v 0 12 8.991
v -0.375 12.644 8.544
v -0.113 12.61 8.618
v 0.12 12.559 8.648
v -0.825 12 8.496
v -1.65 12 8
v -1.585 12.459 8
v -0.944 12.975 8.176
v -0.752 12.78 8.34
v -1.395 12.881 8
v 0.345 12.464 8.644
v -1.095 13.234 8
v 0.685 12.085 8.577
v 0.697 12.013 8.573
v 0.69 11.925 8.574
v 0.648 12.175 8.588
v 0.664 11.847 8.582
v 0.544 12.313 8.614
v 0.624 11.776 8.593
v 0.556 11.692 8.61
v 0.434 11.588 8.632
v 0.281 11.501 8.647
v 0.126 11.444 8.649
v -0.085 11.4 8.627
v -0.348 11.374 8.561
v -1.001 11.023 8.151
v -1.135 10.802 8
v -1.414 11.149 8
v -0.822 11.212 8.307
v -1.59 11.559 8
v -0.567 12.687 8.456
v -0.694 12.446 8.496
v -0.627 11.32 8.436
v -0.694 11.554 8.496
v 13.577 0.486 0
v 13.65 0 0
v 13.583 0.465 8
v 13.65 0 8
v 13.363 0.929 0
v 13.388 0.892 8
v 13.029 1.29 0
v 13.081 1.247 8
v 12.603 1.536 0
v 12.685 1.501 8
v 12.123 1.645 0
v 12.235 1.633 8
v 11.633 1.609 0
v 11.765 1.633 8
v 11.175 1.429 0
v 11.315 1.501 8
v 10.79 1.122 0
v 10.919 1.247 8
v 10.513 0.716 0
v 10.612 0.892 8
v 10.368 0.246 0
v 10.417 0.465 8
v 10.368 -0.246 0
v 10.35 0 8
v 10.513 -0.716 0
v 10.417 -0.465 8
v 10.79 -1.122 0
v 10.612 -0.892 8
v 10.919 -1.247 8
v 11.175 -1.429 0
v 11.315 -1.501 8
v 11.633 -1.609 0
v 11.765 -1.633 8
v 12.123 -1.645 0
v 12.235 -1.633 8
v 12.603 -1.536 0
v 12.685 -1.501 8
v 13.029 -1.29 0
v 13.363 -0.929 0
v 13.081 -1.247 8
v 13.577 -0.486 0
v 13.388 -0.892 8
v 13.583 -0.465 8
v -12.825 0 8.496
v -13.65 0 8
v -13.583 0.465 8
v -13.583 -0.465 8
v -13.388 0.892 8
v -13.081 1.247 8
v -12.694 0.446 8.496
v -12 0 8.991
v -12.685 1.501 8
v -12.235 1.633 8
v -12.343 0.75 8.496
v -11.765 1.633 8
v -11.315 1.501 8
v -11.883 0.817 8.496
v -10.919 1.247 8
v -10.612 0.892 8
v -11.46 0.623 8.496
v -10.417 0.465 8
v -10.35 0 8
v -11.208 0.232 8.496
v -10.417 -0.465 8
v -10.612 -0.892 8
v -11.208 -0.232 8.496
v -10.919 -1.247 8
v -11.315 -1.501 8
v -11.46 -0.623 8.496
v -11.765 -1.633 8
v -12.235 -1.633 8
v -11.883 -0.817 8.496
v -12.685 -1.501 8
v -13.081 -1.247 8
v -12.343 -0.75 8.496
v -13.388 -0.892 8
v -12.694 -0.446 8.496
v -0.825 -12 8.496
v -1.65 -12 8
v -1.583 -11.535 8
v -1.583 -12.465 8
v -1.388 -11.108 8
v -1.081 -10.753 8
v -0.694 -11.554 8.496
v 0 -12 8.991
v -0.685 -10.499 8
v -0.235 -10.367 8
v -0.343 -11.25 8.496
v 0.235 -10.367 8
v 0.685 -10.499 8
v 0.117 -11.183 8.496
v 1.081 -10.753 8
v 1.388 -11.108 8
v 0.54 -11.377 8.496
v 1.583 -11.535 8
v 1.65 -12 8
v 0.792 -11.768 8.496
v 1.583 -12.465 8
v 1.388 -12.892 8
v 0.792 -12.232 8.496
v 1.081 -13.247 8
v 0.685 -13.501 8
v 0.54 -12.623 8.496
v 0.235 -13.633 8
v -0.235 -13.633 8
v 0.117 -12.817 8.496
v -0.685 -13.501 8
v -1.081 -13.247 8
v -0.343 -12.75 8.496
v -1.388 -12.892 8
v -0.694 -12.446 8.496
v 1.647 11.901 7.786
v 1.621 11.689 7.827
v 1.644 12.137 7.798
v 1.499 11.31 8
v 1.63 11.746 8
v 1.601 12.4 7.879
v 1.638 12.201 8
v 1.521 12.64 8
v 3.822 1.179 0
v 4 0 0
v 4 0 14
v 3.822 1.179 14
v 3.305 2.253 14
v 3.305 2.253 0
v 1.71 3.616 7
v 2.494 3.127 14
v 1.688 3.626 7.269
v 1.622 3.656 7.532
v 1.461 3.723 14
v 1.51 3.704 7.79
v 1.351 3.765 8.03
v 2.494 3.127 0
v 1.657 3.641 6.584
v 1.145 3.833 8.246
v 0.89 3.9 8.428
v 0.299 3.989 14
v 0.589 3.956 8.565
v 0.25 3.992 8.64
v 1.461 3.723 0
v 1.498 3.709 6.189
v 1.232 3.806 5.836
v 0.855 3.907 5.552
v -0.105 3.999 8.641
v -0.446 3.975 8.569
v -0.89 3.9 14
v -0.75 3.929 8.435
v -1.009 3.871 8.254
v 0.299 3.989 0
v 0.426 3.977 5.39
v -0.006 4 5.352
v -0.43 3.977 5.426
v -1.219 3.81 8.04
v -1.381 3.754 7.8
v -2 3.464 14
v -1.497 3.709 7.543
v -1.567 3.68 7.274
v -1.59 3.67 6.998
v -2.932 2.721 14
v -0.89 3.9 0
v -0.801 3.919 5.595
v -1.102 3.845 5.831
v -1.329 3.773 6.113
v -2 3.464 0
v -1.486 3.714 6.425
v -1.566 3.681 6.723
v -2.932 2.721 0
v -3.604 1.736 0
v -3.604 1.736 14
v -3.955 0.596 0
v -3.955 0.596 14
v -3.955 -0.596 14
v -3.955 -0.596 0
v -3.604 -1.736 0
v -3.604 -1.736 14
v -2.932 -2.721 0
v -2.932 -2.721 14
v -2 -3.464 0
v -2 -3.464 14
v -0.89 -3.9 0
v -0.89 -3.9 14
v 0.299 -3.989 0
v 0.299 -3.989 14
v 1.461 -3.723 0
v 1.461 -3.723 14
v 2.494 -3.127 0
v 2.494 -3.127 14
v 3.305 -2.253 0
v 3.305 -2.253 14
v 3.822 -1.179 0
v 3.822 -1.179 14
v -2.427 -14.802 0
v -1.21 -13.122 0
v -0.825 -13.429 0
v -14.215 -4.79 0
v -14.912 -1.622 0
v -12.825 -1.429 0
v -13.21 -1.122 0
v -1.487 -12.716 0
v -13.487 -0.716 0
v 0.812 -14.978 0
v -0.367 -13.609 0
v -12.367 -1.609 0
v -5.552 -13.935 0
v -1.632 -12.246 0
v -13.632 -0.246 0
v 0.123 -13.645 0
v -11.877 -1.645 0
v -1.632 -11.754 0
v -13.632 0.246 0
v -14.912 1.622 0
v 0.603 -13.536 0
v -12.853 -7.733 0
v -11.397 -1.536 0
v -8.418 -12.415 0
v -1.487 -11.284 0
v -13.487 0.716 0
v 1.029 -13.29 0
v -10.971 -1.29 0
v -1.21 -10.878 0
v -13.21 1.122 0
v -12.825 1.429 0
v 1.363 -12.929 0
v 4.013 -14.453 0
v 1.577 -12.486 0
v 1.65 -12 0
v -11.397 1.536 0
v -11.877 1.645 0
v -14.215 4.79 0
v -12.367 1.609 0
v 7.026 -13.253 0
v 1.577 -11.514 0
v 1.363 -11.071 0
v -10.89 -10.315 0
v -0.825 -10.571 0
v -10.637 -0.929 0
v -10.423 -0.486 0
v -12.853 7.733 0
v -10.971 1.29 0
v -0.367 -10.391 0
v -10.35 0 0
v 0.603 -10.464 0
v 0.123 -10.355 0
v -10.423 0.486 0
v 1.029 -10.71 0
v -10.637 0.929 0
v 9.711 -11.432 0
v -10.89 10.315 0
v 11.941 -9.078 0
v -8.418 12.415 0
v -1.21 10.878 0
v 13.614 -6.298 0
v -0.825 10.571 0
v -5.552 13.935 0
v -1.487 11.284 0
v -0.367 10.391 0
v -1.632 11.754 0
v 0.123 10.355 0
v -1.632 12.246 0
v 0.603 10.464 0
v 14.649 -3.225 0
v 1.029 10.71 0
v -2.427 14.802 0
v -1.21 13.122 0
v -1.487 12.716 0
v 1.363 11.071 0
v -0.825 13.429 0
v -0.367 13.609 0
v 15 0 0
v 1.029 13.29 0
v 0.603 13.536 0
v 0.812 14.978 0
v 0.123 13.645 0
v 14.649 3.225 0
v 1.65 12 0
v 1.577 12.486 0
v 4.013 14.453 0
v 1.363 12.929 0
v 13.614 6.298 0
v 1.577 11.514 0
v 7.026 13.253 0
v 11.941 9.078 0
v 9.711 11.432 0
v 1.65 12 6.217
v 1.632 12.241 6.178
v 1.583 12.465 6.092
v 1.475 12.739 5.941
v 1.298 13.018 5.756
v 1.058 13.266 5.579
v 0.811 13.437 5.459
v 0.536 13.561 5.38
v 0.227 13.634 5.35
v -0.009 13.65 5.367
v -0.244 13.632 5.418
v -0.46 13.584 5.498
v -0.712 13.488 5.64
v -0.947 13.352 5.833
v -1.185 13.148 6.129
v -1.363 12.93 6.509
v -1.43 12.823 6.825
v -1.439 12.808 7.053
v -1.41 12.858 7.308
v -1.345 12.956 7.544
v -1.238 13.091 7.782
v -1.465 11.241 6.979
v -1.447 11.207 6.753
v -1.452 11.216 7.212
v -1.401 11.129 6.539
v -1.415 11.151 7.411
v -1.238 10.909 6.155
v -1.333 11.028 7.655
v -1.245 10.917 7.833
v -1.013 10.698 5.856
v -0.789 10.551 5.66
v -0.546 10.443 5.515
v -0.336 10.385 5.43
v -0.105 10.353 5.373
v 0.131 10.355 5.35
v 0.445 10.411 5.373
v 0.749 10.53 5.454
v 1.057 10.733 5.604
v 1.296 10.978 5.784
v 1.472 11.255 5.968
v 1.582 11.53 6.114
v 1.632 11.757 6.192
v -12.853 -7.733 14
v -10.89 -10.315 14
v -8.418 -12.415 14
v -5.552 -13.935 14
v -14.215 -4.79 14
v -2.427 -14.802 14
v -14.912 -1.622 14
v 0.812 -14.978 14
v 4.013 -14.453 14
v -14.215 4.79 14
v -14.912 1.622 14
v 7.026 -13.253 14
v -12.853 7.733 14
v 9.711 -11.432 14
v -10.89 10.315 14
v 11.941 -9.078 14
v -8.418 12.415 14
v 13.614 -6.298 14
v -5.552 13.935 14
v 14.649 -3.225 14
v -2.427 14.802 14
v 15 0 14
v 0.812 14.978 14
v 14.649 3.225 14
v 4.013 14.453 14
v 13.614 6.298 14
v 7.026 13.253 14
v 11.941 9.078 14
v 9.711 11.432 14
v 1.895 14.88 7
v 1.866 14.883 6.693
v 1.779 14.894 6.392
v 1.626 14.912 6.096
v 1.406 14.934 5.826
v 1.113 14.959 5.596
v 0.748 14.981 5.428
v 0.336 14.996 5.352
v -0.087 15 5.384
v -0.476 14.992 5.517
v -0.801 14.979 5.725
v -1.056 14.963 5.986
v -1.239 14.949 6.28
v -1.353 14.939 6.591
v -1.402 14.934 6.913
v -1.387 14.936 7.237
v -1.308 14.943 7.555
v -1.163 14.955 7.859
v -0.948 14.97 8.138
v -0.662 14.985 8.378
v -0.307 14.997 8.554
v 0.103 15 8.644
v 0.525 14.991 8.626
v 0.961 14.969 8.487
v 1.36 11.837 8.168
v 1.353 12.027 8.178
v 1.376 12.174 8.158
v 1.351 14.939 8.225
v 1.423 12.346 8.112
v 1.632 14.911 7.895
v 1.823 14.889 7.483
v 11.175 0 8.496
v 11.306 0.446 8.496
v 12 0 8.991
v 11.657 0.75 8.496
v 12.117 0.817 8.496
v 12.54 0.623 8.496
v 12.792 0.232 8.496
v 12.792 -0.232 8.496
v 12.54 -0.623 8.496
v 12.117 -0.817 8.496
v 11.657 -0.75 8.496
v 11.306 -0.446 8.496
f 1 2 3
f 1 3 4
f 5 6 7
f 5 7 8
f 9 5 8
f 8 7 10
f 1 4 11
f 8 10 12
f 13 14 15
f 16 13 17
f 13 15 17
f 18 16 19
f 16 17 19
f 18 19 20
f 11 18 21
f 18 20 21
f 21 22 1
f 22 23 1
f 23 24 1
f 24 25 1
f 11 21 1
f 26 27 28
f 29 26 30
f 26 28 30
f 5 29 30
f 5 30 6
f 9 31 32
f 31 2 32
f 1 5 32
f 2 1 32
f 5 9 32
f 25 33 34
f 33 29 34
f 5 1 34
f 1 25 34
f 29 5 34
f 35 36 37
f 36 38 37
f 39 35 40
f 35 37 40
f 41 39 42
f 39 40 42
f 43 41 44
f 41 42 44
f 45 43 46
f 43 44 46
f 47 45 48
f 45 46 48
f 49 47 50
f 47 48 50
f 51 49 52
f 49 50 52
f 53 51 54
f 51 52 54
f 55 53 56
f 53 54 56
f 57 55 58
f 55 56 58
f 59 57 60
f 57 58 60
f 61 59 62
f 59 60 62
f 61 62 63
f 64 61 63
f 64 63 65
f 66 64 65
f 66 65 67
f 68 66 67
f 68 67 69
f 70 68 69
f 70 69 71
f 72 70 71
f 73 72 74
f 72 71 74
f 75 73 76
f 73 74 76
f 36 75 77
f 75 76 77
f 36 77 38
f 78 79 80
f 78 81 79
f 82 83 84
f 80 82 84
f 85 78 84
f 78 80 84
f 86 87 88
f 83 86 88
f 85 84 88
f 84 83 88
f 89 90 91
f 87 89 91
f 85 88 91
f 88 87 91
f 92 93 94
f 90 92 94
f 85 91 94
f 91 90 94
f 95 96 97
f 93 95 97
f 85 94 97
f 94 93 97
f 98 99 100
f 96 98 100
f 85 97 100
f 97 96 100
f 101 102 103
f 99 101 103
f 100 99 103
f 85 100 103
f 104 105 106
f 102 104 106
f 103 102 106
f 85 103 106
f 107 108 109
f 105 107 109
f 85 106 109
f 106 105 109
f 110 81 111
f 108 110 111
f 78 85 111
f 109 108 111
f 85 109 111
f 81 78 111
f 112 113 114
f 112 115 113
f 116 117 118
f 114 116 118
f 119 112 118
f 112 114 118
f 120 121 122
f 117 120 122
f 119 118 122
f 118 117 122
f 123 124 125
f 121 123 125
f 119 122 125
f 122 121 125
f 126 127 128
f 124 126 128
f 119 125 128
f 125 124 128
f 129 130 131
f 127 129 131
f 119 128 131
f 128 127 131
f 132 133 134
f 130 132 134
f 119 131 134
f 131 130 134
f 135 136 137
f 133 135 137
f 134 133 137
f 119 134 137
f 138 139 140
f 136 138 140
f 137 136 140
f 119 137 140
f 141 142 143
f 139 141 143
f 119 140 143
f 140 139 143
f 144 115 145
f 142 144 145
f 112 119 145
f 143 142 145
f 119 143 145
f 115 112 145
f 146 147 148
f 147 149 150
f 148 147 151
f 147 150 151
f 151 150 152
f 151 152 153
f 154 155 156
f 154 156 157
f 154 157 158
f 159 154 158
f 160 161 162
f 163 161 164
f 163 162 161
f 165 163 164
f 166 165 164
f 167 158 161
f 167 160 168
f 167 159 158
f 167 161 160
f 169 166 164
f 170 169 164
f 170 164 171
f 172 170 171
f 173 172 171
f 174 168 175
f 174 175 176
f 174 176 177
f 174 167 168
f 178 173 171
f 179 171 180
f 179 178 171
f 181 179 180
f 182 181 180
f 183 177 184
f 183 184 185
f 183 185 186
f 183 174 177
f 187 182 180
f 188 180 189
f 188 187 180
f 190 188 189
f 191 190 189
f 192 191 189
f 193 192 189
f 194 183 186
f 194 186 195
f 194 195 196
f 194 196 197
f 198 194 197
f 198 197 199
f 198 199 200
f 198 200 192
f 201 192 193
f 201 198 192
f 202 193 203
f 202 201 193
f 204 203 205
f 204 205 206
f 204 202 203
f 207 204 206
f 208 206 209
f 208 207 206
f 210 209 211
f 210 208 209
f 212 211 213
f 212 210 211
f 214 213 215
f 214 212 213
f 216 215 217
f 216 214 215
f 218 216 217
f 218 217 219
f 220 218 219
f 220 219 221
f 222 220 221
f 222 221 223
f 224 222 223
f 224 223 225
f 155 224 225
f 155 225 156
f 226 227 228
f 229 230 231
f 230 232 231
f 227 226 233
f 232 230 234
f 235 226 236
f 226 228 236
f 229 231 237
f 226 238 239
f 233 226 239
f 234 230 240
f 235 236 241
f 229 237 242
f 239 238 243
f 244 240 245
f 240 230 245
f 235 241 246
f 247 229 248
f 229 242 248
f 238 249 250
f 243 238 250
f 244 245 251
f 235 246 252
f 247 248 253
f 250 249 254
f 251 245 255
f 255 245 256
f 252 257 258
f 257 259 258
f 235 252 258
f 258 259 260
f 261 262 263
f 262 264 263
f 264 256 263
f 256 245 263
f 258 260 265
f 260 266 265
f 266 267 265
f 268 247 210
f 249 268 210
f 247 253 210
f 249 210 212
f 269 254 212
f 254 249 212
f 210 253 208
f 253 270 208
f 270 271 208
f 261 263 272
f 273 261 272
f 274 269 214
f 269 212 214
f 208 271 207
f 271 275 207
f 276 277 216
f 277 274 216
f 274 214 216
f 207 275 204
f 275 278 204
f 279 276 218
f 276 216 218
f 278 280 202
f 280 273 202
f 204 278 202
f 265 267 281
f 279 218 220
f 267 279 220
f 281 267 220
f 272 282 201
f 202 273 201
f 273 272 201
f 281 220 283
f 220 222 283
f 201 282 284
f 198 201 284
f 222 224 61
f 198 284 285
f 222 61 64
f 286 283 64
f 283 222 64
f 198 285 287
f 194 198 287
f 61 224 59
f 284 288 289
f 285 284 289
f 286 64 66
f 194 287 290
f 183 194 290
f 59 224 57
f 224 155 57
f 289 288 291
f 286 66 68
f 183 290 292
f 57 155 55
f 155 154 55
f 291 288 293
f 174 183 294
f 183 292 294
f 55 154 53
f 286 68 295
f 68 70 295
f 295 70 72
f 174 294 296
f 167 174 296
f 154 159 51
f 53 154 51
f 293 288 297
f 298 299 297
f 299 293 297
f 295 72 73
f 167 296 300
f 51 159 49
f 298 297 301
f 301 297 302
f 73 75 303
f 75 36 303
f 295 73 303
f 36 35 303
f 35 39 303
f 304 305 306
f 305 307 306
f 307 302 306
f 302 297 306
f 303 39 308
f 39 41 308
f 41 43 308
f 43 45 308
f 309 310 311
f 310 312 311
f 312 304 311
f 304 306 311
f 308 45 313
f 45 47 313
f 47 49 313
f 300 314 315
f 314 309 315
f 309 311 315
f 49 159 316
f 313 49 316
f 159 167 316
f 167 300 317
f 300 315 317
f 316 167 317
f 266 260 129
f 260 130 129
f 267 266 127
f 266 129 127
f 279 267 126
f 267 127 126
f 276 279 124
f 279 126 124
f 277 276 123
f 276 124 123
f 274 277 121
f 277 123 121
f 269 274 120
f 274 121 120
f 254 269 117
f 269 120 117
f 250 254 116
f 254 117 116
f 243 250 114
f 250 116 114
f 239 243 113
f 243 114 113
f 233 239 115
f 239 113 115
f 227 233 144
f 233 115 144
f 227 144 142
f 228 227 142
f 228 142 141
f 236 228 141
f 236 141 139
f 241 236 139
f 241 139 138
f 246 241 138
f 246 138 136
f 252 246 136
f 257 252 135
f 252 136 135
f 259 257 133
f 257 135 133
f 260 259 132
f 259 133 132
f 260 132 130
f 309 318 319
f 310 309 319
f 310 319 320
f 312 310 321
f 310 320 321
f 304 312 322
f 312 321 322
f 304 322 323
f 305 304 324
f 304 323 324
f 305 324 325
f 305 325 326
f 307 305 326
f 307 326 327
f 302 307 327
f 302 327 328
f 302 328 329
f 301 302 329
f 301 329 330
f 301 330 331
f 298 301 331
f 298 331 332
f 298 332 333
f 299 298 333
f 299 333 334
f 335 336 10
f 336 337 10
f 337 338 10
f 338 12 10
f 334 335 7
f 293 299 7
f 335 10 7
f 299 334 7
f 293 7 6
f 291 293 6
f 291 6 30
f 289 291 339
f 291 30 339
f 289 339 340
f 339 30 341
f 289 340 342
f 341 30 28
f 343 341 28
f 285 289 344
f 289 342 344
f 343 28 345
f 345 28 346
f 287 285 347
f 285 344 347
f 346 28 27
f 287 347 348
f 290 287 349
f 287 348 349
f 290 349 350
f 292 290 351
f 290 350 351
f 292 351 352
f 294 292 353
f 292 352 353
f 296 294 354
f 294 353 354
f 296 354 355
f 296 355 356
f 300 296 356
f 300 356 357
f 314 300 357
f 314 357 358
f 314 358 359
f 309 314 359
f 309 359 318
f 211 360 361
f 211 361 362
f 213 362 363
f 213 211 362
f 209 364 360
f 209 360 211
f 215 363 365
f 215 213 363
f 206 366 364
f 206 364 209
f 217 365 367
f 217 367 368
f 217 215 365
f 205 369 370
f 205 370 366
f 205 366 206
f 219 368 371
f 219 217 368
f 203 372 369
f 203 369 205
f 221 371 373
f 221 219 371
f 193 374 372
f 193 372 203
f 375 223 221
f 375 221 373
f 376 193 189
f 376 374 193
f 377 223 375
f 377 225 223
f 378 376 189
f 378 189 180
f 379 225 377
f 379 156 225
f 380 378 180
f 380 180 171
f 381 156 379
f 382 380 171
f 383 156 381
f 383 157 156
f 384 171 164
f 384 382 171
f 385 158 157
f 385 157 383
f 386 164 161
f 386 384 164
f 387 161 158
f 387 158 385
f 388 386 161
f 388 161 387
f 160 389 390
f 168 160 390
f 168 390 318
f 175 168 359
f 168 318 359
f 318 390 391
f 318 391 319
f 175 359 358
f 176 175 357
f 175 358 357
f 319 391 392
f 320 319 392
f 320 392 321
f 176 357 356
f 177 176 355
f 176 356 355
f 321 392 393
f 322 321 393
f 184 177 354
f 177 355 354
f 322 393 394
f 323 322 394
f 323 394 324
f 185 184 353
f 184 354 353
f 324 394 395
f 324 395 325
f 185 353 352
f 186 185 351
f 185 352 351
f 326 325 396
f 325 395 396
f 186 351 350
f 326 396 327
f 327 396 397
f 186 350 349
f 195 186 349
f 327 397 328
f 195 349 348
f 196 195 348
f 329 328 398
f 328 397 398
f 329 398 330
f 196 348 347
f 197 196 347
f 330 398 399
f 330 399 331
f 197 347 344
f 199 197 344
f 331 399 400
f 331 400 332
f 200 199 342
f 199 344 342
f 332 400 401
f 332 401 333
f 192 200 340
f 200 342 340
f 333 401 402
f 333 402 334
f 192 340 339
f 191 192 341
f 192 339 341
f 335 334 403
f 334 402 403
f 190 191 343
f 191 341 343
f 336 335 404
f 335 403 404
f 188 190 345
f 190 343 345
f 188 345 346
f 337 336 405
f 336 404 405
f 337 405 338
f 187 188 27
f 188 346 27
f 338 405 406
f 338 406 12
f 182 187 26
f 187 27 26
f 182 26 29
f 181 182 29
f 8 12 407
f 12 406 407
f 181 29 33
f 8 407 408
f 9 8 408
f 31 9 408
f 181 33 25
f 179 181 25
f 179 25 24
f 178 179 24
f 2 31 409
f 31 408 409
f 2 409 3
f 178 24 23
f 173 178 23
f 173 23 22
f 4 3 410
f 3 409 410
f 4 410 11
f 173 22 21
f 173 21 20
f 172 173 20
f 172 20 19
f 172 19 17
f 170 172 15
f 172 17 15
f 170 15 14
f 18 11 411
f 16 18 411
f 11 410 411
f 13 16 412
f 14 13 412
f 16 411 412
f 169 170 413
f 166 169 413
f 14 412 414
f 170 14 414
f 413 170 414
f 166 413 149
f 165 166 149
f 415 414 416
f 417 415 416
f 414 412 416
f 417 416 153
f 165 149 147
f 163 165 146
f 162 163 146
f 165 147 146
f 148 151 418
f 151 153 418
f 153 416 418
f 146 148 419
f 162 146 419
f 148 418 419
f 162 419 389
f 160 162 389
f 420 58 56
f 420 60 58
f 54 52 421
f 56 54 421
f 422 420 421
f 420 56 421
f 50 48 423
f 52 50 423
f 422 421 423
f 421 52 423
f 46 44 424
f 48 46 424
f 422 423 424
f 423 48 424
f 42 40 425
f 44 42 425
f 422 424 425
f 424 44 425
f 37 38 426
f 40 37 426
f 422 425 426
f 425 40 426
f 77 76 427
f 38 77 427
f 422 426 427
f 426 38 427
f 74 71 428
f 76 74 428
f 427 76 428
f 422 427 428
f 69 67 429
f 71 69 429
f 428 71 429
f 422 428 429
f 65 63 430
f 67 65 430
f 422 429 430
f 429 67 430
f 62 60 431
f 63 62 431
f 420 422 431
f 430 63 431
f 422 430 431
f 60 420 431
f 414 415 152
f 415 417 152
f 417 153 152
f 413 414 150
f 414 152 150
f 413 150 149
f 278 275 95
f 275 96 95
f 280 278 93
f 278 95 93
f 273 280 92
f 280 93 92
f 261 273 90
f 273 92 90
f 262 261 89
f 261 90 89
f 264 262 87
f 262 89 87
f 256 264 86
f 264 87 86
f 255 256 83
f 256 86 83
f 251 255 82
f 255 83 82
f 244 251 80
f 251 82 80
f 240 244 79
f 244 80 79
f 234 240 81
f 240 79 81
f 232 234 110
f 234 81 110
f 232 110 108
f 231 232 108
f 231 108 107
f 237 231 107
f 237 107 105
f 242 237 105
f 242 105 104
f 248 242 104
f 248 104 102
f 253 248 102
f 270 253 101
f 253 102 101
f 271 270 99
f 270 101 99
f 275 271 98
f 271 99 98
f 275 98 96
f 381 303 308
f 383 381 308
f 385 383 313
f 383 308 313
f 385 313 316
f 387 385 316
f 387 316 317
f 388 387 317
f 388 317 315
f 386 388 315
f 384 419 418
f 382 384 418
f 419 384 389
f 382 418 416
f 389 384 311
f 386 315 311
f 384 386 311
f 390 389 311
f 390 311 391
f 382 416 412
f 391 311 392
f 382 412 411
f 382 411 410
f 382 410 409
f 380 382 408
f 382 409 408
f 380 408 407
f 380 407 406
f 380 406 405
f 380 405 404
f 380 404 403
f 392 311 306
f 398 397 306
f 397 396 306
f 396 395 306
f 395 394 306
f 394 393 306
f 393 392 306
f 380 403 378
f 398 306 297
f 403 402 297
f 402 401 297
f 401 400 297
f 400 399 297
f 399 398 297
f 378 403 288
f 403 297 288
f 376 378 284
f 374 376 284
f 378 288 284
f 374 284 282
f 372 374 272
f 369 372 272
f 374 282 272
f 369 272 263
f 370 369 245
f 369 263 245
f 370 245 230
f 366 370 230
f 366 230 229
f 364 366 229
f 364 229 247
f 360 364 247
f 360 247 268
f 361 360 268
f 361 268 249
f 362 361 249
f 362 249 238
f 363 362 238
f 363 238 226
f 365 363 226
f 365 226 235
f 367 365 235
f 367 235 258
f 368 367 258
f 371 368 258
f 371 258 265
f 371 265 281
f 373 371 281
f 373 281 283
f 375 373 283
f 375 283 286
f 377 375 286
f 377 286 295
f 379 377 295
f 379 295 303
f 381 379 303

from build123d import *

# Parameters (mm, degrees)
SKETCH1_R                  = 15
SKETCH1_R_2                = 4
BOSS_EXTRUDE1_DEPTH        = 14
M4X0_7_TAPPED_HOLE1_REACH  = 36.371
M4X0_7_TAPPED_HOLE1_BORE_R = 1.65
M4X0_7_TAPPED_HOLE3_D      = 3.3
M4X0_7_TAPPED_HOLE3_DEPTH  = 8
M4X0_7_TAPPED_HOLE3_TIP    = 0.991420021


with BuildPart() as part:
    # Sketch1 → Boss-Extrude1 (new body)
    with BuildSketch(Plane.XY):
        Circle(SKETCH1_R)
        Circle(SKETCH1_R_2, mode=Mode.SUBTRACT)
    extrude(amount=BOSS_EXTRUDE1_DEPTH)

    # M4x0.7 Tapped Hole1 bore (on position points) → M4x0.7 Tapped Hole1 (cut, up to next)
    with BuildSketch(Plane(origin=(0.246830438, 14.99796902, 7), x_dir=(0.999864601356, -0.016455362532, 0), z_dir=(0.016455362532, 0.999864601356, 0)), mode=Mode.PRIVATE) as m4x0_7_tapped_hole1_sk1:
        Circle(M4X0_7_TAPPED_HOLE1_BORE_R)
    m4x0_7_tapped_hole1_tool1 = extrude(m4x0_7_tapped_hole1_sk1.sketch, amount=-M4X0_7_TAPPED_HOLE1_REACH, mode=Mode.PRIVATE) & part.part
    add(m4x0_7_tapped_hole1_tool1.solids().sort_by_distance((0.24683, 14.997969, 7))[0], mode=Mode.SUBTRACT)

    # M4x0.7 Tapped Hole3
    with Locations(Plane(origin=(0, 0, 0), x_dir=(-1, 0, 0), z_dir=(0, 0, -1))):
        with Locations((0, 12), (-12, 0), (0, -12), (12, 0)):
            Hole(M4X0_7_TAPPED_HOLE3_D / 2, depth=M4X0_7_TAPPED_HOLE3_DEPTH)
            with Locations((0, 0, -(M4X0_7_TAPPED_HOLE3_DEPTH + M4X0_7_TAPPED_HOLE3_TIP / 2))):  # 118° drill point
                Cone(0, M4X0_7_TAPPED_HOLE3_D / 2, M4X0_7_TAPPED_HOLE3_TIP, mode=Mode.SUBTRACT)


solid = part.part
